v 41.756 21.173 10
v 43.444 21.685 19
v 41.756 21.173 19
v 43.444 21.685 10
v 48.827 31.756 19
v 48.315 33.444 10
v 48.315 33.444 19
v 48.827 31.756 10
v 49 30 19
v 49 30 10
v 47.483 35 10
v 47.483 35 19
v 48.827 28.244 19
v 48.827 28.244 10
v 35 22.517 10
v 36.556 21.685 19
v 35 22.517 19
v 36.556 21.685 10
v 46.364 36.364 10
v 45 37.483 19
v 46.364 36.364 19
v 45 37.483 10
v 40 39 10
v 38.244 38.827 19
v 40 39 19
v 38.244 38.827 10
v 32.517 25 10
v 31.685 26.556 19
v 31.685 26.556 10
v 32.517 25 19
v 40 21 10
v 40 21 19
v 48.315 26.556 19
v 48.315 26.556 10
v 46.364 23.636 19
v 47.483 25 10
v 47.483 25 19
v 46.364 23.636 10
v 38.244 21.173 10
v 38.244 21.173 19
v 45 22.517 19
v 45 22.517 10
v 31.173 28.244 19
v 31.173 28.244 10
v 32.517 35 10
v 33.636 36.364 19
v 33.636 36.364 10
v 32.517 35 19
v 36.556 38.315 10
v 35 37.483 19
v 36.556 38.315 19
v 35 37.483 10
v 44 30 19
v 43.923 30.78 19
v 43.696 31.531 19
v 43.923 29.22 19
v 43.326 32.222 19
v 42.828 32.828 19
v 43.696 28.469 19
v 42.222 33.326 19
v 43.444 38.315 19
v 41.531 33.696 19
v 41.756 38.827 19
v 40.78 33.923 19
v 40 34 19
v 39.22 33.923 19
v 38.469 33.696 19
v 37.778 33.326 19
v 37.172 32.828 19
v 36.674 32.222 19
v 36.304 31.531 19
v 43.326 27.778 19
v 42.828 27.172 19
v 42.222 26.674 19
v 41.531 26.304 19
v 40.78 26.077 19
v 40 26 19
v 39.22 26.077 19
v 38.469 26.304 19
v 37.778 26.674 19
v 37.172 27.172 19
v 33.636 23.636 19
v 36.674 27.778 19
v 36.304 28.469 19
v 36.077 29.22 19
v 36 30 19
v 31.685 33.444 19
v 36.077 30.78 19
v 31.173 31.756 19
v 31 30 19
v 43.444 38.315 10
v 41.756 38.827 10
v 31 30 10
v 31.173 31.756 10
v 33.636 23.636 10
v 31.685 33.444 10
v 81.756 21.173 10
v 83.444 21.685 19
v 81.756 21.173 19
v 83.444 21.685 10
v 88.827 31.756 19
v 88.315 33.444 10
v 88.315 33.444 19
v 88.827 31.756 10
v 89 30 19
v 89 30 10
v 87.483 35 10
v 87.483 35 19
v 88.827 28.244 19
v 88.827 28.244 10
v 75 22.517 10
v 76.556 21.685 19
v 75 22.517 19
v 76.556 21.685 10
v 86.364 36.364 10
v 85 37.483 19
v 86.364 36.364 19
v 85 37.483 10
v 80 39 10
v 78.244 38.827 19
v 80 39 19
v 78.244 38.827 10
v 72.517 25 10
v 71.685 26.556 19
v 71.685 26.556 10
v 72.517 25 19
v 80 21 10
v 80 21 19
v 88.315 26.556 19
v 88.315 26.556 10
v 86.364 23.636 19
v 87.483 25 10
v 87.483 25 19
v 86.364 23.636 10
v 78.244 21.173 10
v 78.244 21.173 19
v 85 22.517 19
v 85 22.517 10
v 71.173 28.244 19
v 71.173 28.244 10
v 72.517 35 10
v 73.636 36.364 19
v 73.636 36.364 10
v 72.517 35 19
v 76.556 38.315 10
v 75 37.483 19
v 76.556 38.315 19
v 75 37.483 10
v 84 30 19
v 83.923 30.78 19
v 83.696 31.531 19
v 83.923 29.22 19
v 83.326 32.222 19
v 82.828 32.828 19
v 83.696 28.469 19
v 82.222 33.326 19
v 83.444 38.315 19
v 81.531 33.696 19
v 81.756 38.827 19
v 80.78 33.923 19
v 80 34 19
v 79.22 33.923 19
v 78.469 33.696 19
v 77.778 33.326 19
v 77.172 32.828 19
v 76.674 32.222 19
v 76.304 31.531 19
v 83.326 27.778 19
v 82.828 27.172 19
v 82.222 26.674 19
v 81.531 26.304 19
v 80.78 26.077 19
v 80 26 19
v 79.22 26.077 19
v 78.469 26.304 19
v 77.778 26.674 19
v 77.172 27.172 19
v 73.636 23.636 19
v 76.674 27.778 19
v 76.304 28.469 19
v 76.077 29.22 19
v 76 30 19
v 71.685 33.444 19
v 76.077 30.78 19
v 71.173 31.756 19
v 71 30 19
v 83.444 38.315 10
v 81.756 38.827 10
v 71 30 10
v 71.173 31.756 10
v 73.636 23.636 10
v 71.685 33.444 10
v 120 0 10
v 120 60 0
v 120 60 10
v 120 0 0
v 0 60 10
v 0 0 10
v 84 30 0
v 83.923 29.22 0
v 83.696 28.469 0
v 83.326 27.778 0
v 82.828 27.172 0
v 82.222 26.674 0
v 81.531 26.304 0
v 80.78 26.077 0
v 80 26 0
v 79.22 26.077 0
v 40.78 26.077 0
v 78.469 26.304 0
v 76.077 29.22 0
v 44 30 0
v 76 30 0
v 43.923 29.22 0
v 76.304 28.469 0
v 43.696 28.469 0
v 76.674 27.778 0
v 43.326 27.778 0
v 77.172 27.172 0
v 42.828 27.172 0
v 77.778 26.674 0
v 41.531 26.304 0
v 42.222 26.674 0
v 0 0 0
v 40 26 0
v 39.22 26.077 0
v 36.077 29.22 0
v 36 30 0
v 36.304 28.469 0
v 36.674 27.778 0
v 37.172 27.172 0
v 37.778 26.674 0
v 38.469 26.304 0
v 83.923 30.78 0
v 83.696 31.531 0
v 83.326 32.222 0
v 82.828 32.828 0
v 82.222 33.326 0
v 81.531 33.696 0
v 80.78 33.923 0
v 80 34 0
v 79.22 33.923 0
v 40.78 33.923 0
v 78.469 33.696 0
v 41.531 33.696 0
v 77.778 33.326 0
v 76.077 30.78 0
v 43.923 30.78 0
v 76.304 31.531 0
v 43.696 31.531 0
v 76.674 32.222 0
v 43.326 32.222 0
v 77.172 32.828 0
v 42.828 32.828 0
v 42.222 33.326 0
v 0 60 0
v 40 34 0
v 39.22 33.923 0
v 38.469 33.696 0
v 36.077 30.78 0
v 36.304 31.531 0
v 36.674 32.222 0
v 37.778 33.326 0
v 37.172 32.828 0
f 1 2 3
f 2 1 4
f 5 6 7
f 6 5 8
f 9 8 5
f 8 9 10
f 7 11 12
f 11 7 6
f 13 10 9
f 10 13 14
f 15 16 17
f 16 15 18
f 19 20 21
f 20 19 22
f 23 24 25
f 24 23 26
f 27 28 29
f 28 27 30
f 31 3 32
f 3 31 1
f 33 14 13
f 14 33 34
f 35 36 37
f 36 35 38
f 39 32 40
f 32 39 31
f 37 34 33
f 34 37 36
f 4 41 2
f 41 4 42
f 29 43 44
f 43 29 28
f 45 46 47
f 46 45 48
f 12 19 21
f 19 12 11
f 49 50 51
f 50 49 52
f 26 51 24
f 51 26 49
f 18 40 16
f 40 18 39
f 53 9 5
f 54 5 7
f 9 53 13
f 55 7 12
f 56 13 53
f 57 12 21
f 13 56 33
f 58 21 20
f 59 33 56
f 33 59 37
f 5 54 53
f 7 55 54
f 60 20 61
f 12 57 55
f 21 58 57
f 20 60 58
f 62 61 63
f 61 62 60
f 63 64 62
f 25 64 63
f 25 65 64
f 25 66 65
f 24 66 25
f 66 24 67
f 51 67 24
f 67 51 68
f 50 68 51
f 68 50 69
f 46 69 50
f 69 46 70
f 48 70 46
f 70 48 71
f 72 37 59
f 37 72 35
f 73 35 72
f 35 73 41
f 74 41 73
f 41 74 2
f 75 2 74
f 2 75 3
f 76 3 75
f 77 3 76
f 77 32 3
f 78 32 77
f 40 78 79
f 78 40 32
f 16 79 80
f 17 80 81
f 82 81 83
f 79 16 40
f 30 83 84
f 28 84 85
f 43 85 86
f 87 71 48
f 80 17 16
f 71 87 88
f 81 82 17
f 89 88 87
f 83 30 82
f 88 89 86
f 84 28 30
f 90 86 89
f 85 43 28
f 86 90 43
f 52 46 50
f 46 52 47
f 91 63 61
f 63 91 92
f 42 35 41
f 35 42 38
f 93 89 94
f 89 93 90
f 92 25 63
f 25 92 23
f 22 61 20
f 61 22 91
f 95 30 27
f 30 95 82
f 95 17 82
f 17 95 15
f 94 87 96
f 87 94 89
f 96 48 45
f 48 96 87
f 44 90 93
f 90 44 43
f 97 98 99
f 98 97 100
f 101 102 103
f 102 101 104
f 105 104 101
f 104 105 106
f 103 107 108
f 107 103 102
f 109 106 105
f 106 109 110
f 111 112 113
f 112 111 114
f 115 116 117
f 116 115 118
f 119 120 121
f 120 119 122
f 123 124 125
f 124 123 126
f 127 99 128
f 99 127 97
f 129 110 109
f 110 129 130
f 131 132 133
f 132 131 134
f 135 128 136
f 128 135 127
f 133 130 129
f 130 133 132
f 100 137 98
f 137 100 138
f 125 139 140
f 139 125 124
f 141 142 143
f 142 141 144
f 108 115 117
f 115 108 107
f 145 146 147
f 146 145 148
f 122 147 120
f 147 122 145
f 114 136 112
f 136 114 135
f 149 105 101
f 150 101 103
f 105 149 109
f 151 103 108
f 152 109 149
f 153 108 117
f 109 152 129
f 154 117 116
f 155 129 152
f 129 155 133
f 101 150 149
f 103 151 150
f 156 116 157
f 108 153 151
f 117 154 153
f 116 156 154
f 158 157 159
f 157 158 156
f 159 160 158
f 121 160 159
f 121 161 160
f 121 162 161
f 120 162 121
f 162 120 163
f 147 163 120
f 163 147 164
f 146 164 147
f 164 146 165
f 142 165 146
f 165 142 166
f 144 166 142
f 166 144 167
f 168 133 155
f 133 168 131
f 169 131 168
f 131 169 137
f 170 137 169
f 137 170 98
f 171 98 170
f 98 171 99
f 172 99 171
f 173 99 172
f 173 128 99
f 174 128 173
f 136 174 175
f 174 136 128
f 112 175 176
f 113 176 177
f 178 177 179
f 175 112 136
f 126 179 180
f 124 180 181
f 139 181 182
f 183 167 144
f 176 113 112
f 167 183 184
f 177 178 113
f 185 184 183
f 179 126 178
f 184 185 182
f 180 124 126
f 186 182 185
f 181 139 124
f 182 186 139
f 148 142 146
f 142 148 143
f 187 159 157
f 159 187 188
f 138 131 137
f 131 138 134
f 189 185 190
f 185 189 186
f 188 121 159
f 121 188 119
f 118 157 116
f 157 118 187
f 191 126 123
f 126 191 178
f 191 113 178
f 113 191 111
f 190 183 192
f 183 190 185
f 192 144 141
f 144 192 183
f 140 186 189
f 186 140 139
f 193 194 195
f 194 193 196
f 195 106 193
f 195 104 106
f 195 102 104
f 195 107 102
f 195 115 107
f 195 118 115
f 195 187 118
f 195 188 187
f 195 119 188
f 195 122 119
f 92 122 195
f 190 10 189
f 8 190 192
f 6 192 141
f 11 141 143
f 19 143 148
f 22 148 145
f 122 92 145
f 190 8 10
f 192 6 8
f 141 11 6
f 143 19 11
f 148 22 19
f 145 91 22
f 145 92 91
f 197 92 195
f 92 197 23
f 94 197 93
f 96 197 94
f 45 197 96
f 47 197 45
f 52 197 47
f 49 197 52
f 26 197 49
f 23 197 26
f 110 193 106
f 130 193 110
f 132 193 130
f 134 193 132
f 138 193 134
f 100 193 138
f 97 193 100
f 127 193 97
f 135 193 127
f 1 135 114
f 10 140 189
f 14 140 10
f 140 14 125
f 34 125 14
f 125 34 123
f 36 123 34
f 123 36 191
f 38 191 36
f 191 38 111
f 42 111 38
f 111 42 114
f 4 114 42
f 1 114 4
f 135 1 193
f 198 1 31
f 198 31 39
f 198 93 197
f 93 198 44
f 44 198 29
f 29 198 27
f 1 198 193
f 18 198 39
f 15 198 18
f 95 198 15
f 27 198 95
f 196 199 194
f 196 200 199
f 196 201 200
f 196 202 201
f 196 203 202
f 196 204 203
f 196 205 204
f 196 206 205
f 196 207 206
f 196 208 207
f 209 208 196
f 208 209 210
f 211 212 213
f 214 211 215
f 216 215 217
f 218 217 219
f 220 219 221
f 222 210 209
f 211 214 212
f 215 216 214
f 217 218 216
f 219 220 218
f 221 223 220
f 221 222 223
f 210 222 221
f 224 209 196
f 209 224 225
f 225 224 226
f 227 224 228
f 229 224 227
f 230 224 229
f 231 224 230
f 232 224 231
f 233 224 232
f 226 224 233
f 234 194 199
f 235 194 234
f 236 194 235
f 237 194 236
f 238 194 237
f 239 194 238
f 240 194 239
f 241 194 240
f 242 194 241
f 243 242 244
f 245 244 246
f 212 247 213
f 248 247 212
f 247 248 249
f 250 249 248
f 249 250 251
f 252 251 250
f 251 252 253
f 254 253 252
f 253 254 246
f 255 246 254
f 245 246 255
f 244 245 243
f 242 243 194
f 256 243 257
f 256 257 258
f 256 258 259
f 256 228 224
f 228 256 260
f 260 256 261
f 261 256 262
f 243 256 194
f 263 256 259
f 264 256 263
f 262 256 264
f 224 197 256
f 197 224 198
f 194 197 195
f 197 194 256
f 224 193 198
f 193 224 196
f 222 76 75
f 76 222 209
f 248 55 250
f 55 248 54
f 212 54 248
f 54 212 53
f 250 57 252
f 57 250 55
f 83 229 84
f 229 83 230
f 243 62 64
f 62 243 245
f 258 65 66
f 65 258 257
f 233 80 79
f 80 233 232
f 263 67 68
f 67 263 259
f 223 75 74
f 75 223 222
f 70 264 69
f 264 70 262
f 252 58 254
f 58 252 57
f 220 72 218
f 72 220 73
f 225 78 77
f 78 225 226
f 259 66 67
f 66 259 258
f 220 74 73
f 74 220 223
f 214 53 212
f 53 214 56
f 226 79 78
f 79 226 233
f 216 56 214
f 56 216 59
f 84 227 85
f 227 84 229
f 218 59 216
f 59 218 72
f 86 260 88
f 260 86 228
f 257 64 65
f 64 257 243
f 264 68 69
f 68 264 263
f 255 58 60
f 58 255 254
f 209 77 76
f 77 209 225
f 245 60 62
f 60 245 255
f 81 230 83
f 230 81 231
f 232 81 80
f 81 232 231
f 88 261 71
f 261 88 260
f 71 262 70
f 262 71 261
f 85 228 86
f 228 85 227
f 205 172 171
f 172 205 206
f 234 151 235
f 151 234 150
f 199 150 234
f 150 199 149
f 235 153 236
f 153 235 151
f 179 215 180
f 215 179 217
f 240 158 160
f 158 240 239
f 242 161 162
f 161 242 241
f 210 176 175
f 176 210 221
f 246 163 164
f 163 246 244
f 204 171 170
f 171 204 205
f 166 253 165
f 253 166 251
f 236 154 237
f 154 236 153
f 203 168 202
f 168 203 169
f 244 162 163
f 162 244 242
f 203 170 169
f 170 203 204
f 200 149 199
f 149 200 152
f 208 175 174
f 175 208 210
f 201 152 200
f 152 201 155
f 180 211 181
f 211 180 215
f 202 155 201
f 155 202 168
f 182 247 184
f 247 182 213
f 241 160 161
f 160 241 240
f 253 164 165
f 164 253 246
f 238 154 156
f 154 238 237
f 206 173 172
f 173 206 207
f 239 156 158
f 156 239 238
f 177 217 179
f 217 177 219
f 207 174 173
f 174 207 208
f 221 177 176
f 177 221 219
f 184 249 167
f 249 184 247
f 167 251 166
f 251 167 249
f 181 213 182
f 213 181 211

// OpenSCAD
$fn = 32;

// ----------------------------------------------------------------------
// Drill jig: two_boss jig
// ----------------------------------------------------------------------

// --- parameters (mm) ---
plate_l = 120;            // plate length, X
plate_w = 60;             // plate width, Y
plate_t = 10;             // plate thickness
boss_d = 18;              // guide boss diameter
boss_h = 10;              // boss height above the plate
guide_d = 8;              // guide hole diameter
boss_pitch = 40;          // boss pitch

n_boss = 2;  // guide bosses
boss_x0 = (plate_l - (n_boss - 1) * boss_pitch) / 2;  // first boss X
boss_top = plate_t - 1 + boss_h;  // boss crown height
total_h = boss_top;  // overall height

difference() {
  union() {
  cube([plate_l, plate_w, plate_t]);
  for (i = [0 : n_boss - 1])
    translate([boss_x0 + i * boss_pitch, plate_w / 2, plate_t - 1])
      cylinder(h = boss_h, d = boss_d);
  }
  for (i = [0 : n_boss - 1])
    translate([boss_x0 + i * boss_pitch, plate_w / 2, -1])
      cylinder(h = plate_t + boss_h, d = guide_d);
}
